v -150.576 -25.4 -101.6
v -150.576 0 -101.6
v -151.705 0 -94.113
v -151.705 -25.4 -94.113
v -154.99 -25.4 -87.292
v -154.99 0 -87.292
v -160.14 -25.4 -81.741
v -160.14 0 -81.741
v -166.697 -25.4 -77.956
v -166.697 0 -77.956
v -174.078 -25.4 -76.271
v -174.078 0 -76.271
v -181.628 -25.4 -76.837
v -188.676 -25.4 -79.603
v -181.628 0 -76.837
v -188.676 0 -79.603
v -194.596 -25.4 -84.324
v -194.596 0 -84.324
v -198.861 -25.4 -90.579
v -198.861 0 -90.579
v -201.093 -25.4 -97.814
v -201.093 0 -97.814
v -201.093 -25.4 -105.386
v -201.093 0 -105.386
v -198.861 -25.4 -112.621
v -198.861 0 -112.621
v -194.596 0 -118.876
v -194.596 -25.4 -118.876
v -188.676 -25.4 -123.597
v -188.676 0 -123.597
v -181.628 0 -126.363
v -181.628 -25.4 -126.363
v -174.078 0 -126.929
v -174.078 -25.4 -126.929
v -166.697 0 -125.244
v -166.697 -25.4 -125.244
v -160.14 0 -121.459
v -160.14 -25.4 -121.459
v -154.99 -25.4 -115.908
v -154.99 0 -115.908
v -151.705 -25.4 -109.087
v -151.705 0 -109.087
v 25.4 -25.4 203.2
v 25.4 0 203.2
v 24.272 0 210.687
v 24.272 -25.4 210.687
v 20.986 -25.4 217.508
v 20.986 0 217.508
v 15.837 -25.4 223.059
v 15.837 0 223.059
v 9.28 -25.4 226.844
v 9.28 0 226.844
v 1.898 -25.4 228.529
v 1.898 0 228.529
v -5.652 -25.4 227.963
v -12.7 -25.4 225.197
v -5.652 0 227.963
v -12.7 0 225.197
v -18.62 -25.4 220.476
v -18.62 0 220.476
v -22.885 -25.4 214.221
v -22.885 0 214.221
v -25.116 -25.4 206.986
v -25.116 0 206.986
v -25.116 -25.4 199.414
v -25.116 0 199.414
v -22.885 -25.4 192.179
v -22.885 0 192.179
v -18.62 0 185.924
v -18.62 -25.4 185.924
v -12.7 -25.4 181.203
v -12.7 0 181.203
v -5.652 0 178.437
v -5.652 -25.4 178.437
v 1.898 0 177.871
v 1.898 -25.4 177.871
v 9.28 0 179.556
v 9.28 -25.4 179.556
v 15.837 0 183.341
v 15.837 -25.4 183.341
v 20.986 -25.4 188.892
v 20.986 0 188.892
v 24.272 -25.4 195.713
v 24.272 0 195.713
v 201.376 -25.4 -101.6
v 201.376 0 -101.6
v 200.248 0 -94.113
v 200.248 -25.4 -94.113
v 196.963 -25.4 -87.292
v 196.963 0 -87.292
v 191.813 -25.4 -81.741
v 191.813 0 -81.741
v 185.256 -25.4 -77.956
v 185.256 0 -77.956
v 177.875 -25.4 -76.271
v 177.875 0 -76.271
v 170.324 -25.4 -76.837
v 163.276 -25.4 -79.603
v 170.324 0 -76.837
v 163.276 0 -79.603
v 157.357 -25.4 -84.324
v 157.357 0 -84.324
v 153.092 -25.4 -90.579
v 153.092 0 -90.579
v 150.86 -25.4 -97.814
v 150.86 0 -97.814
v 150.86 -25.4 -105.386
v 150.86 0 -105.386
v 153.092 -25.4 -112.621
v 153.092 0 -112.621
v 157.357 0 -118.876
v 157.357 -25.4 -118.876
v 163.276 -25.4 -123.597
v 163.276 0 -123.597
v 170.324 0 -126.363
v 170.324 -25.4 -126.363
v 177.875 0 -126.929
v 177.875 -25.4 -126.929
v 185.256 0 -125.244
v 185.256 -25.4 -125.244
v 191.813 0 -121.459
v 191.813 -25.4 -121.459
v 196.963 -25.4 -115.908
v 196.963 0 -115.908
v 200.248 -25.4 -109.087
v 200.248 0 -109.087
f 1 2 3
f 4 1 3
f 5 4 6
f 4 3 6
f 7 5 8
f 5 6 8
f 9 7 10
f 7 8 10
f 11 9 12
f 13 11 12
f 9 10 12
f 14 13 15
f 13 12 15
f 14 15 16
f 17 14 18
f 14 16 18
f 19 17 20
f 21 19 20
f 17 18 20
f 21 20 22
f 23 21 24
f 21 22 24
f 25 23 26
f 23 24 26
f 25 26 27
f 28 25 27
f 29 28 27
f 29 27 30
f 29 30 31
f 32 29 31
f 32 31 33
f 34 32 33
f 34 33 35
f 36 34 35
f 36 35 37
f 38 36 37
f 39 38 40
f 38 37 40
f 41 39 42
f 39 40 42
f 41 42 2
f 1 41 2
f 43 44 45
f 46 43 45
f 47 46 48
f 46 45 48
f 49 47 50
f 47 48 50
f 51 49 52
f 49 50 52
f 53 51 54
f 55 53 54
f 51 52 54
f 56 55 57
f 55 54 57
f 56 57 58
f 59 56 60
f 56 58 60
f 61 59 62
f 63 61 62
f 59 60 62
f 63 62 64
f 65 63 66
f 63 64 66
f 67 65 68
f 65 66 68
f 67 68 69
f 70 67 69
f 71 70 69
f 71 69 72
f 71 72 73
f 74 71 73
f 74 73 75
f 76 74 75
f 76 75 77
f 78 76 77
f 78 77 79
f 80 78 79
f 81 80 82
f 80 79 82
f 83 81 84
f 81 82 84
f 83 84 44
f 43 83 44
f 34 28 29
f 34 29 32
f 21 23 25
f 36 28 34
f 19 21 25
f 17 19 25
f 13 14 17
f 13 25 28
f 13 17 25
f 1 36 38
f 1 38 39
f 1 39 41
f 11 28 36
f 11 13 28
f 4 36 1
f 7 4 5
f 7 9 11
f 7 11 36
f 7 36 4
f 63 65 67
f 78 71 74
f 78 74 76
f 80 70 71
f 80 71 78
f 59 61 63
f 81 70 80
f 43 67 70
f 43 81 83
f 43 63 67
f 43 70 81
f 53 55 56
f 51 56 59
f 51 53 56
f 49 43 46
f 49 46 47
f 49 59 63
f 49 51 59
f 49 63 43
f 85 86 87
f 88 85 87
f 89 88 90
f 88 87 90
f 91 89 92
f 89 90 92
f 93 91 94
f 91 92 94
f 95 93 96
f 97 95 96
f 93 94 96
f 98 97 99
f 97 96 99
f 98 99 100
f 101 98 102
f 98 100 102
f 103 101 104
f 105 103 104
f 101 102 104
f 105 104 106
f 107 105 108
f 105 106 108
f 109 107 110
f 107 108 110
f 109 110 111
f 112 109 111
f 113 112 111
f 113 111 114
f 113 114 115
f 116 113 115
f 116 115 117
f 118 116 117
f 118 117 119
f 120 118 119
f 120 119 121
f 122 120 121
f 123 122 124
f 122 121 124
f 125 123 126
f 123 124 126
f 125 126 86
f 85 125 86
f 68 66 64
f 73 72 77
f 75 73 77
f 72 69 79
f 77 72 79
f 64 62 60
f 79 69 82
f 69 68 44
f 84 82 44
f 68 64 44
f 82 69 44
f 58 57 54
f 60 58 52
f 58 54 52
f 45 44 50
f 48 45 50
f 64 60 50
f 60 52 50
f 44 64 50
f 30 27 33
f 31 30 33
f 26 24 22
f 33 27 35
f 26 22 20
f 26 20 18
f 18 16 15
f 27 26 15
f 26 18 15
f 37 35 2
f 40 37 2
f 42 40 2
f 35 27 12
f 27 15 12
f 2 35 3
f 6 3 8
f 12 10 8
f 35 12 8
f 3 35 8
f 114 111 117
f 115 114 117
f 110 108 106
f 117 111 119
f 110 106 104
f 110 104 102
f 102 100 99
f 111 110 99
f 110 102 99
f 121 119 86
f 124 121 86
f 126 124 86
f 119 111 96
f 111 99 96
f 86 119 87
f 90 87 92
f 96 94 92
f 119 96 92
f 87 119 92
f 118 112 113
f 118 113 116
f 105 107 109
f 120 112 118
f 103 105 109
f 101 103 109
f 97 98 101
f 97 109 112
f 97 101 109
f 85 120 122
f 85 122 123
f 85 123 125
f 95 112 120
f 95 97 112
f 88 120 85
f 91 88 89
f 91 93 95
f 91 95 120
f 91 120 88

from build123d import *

# Parameters (mm, degrees)
F0_R     = 25.4
F1_DEPTH = 25.4


with BuildPart() as f1:
    # F0 (on Front) → F1 (new body)
    with BuildSketch(Plane.XZ):
        with Locations((0, 203.2)):
            Circle(F0_R)
        with Locations((175.976362, -101.6)):
            Circle(F0_R)
        with Locations((-175.976362, -101.6)):
            Circle(F0_R)
    extrude(amount=F1_DEPTH)


solid = f1.part
